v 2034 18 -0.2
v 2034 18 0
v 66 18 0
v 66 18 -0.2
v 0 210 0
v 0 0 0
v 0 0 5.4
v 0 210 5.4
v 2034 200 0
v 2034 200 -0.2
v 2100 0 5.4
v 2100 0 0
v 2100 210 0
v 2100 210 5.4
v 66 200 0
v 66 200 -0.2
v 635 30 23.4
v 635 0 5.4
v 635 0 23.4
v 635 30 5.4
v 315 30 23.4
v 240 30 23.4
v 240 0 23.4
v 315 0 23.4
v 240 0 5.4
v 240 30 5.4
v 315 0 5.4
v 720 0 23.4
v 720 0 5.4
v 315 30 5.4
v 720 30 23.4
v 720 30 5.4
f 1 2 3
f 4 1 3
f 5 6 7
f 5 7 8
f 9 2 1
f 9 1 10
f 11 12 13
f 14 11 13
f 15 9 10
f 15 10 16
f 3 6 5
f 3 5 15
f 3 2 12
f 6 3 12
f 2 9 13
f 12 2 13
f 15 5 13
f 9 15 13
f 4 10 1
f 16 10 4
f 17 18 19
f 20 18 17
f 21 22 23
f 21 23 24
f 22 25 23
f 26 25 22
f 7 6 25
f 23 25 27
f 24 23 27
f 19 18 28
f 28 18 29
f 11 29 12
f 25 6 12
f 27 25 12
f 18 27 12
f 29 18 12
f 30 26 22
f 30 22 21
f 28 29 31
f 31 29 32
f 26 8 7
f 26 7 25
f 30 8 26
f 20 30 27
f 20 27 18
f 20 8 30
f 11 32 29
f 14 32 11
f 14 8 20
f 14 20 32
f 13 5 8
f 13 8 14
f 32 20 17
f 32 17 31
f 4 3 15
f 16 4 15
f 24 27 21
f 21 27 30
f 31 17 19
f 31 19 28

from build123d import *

# Parameters (mm, degrees)
SKETCH_1_W      = 2100
SKETCH_1_H      = 210
EXTRUDE_1_DEPTH = 5.4
SKETCH_2_W      = 75
SKETCH_2_H      = 30
SKETCH_2_W_2    = 85
EXTRUDE_2_DEPTH = 18
SKETCH_4_W      = 1968
SKETCH_4_H      = 182
EXTRUDE_3_DEPTH = 0.2


with BuildPart() as part:
    # 草图1 → 凸台-拉伸1 (new body)
    with BuildSketch(Plane.XY):
        with Locations((1050, 105)):
            Rectangle(SKETCH_1_W, SKETCH_1_H)
    extrude(amount=EXTRUDE_1_DEPTH)

    # 草图2 → 凸台-拉伸2 (add)
    with BuildSketch(Plane.XY.offset(5.4)):
        with Locations((277.5, 15)):
            Rectangle(SKETCH_2_W, SKETCH_2_H)
        with Locations((677.5, 15)):
            Rectangle(SKETCH_2_W_2, SKETCH_2_H)
    extrude(amount=EXTRUDE_2_DEPTH)

    # 草图4 → 凸台-拉伸3 (add)
    with BuildSketch(Plane(origin=(0, 0, 0), x_dir=(-1, 0, 0), z_dir=(0, 0, -1))):
        with Locations((-1050, 109)):
            Rectangle(SKETCH_4_W, SKETCH_4_H)
    extrude(amount=EXTRUDE_3_DEPTH)


solid = part.part
